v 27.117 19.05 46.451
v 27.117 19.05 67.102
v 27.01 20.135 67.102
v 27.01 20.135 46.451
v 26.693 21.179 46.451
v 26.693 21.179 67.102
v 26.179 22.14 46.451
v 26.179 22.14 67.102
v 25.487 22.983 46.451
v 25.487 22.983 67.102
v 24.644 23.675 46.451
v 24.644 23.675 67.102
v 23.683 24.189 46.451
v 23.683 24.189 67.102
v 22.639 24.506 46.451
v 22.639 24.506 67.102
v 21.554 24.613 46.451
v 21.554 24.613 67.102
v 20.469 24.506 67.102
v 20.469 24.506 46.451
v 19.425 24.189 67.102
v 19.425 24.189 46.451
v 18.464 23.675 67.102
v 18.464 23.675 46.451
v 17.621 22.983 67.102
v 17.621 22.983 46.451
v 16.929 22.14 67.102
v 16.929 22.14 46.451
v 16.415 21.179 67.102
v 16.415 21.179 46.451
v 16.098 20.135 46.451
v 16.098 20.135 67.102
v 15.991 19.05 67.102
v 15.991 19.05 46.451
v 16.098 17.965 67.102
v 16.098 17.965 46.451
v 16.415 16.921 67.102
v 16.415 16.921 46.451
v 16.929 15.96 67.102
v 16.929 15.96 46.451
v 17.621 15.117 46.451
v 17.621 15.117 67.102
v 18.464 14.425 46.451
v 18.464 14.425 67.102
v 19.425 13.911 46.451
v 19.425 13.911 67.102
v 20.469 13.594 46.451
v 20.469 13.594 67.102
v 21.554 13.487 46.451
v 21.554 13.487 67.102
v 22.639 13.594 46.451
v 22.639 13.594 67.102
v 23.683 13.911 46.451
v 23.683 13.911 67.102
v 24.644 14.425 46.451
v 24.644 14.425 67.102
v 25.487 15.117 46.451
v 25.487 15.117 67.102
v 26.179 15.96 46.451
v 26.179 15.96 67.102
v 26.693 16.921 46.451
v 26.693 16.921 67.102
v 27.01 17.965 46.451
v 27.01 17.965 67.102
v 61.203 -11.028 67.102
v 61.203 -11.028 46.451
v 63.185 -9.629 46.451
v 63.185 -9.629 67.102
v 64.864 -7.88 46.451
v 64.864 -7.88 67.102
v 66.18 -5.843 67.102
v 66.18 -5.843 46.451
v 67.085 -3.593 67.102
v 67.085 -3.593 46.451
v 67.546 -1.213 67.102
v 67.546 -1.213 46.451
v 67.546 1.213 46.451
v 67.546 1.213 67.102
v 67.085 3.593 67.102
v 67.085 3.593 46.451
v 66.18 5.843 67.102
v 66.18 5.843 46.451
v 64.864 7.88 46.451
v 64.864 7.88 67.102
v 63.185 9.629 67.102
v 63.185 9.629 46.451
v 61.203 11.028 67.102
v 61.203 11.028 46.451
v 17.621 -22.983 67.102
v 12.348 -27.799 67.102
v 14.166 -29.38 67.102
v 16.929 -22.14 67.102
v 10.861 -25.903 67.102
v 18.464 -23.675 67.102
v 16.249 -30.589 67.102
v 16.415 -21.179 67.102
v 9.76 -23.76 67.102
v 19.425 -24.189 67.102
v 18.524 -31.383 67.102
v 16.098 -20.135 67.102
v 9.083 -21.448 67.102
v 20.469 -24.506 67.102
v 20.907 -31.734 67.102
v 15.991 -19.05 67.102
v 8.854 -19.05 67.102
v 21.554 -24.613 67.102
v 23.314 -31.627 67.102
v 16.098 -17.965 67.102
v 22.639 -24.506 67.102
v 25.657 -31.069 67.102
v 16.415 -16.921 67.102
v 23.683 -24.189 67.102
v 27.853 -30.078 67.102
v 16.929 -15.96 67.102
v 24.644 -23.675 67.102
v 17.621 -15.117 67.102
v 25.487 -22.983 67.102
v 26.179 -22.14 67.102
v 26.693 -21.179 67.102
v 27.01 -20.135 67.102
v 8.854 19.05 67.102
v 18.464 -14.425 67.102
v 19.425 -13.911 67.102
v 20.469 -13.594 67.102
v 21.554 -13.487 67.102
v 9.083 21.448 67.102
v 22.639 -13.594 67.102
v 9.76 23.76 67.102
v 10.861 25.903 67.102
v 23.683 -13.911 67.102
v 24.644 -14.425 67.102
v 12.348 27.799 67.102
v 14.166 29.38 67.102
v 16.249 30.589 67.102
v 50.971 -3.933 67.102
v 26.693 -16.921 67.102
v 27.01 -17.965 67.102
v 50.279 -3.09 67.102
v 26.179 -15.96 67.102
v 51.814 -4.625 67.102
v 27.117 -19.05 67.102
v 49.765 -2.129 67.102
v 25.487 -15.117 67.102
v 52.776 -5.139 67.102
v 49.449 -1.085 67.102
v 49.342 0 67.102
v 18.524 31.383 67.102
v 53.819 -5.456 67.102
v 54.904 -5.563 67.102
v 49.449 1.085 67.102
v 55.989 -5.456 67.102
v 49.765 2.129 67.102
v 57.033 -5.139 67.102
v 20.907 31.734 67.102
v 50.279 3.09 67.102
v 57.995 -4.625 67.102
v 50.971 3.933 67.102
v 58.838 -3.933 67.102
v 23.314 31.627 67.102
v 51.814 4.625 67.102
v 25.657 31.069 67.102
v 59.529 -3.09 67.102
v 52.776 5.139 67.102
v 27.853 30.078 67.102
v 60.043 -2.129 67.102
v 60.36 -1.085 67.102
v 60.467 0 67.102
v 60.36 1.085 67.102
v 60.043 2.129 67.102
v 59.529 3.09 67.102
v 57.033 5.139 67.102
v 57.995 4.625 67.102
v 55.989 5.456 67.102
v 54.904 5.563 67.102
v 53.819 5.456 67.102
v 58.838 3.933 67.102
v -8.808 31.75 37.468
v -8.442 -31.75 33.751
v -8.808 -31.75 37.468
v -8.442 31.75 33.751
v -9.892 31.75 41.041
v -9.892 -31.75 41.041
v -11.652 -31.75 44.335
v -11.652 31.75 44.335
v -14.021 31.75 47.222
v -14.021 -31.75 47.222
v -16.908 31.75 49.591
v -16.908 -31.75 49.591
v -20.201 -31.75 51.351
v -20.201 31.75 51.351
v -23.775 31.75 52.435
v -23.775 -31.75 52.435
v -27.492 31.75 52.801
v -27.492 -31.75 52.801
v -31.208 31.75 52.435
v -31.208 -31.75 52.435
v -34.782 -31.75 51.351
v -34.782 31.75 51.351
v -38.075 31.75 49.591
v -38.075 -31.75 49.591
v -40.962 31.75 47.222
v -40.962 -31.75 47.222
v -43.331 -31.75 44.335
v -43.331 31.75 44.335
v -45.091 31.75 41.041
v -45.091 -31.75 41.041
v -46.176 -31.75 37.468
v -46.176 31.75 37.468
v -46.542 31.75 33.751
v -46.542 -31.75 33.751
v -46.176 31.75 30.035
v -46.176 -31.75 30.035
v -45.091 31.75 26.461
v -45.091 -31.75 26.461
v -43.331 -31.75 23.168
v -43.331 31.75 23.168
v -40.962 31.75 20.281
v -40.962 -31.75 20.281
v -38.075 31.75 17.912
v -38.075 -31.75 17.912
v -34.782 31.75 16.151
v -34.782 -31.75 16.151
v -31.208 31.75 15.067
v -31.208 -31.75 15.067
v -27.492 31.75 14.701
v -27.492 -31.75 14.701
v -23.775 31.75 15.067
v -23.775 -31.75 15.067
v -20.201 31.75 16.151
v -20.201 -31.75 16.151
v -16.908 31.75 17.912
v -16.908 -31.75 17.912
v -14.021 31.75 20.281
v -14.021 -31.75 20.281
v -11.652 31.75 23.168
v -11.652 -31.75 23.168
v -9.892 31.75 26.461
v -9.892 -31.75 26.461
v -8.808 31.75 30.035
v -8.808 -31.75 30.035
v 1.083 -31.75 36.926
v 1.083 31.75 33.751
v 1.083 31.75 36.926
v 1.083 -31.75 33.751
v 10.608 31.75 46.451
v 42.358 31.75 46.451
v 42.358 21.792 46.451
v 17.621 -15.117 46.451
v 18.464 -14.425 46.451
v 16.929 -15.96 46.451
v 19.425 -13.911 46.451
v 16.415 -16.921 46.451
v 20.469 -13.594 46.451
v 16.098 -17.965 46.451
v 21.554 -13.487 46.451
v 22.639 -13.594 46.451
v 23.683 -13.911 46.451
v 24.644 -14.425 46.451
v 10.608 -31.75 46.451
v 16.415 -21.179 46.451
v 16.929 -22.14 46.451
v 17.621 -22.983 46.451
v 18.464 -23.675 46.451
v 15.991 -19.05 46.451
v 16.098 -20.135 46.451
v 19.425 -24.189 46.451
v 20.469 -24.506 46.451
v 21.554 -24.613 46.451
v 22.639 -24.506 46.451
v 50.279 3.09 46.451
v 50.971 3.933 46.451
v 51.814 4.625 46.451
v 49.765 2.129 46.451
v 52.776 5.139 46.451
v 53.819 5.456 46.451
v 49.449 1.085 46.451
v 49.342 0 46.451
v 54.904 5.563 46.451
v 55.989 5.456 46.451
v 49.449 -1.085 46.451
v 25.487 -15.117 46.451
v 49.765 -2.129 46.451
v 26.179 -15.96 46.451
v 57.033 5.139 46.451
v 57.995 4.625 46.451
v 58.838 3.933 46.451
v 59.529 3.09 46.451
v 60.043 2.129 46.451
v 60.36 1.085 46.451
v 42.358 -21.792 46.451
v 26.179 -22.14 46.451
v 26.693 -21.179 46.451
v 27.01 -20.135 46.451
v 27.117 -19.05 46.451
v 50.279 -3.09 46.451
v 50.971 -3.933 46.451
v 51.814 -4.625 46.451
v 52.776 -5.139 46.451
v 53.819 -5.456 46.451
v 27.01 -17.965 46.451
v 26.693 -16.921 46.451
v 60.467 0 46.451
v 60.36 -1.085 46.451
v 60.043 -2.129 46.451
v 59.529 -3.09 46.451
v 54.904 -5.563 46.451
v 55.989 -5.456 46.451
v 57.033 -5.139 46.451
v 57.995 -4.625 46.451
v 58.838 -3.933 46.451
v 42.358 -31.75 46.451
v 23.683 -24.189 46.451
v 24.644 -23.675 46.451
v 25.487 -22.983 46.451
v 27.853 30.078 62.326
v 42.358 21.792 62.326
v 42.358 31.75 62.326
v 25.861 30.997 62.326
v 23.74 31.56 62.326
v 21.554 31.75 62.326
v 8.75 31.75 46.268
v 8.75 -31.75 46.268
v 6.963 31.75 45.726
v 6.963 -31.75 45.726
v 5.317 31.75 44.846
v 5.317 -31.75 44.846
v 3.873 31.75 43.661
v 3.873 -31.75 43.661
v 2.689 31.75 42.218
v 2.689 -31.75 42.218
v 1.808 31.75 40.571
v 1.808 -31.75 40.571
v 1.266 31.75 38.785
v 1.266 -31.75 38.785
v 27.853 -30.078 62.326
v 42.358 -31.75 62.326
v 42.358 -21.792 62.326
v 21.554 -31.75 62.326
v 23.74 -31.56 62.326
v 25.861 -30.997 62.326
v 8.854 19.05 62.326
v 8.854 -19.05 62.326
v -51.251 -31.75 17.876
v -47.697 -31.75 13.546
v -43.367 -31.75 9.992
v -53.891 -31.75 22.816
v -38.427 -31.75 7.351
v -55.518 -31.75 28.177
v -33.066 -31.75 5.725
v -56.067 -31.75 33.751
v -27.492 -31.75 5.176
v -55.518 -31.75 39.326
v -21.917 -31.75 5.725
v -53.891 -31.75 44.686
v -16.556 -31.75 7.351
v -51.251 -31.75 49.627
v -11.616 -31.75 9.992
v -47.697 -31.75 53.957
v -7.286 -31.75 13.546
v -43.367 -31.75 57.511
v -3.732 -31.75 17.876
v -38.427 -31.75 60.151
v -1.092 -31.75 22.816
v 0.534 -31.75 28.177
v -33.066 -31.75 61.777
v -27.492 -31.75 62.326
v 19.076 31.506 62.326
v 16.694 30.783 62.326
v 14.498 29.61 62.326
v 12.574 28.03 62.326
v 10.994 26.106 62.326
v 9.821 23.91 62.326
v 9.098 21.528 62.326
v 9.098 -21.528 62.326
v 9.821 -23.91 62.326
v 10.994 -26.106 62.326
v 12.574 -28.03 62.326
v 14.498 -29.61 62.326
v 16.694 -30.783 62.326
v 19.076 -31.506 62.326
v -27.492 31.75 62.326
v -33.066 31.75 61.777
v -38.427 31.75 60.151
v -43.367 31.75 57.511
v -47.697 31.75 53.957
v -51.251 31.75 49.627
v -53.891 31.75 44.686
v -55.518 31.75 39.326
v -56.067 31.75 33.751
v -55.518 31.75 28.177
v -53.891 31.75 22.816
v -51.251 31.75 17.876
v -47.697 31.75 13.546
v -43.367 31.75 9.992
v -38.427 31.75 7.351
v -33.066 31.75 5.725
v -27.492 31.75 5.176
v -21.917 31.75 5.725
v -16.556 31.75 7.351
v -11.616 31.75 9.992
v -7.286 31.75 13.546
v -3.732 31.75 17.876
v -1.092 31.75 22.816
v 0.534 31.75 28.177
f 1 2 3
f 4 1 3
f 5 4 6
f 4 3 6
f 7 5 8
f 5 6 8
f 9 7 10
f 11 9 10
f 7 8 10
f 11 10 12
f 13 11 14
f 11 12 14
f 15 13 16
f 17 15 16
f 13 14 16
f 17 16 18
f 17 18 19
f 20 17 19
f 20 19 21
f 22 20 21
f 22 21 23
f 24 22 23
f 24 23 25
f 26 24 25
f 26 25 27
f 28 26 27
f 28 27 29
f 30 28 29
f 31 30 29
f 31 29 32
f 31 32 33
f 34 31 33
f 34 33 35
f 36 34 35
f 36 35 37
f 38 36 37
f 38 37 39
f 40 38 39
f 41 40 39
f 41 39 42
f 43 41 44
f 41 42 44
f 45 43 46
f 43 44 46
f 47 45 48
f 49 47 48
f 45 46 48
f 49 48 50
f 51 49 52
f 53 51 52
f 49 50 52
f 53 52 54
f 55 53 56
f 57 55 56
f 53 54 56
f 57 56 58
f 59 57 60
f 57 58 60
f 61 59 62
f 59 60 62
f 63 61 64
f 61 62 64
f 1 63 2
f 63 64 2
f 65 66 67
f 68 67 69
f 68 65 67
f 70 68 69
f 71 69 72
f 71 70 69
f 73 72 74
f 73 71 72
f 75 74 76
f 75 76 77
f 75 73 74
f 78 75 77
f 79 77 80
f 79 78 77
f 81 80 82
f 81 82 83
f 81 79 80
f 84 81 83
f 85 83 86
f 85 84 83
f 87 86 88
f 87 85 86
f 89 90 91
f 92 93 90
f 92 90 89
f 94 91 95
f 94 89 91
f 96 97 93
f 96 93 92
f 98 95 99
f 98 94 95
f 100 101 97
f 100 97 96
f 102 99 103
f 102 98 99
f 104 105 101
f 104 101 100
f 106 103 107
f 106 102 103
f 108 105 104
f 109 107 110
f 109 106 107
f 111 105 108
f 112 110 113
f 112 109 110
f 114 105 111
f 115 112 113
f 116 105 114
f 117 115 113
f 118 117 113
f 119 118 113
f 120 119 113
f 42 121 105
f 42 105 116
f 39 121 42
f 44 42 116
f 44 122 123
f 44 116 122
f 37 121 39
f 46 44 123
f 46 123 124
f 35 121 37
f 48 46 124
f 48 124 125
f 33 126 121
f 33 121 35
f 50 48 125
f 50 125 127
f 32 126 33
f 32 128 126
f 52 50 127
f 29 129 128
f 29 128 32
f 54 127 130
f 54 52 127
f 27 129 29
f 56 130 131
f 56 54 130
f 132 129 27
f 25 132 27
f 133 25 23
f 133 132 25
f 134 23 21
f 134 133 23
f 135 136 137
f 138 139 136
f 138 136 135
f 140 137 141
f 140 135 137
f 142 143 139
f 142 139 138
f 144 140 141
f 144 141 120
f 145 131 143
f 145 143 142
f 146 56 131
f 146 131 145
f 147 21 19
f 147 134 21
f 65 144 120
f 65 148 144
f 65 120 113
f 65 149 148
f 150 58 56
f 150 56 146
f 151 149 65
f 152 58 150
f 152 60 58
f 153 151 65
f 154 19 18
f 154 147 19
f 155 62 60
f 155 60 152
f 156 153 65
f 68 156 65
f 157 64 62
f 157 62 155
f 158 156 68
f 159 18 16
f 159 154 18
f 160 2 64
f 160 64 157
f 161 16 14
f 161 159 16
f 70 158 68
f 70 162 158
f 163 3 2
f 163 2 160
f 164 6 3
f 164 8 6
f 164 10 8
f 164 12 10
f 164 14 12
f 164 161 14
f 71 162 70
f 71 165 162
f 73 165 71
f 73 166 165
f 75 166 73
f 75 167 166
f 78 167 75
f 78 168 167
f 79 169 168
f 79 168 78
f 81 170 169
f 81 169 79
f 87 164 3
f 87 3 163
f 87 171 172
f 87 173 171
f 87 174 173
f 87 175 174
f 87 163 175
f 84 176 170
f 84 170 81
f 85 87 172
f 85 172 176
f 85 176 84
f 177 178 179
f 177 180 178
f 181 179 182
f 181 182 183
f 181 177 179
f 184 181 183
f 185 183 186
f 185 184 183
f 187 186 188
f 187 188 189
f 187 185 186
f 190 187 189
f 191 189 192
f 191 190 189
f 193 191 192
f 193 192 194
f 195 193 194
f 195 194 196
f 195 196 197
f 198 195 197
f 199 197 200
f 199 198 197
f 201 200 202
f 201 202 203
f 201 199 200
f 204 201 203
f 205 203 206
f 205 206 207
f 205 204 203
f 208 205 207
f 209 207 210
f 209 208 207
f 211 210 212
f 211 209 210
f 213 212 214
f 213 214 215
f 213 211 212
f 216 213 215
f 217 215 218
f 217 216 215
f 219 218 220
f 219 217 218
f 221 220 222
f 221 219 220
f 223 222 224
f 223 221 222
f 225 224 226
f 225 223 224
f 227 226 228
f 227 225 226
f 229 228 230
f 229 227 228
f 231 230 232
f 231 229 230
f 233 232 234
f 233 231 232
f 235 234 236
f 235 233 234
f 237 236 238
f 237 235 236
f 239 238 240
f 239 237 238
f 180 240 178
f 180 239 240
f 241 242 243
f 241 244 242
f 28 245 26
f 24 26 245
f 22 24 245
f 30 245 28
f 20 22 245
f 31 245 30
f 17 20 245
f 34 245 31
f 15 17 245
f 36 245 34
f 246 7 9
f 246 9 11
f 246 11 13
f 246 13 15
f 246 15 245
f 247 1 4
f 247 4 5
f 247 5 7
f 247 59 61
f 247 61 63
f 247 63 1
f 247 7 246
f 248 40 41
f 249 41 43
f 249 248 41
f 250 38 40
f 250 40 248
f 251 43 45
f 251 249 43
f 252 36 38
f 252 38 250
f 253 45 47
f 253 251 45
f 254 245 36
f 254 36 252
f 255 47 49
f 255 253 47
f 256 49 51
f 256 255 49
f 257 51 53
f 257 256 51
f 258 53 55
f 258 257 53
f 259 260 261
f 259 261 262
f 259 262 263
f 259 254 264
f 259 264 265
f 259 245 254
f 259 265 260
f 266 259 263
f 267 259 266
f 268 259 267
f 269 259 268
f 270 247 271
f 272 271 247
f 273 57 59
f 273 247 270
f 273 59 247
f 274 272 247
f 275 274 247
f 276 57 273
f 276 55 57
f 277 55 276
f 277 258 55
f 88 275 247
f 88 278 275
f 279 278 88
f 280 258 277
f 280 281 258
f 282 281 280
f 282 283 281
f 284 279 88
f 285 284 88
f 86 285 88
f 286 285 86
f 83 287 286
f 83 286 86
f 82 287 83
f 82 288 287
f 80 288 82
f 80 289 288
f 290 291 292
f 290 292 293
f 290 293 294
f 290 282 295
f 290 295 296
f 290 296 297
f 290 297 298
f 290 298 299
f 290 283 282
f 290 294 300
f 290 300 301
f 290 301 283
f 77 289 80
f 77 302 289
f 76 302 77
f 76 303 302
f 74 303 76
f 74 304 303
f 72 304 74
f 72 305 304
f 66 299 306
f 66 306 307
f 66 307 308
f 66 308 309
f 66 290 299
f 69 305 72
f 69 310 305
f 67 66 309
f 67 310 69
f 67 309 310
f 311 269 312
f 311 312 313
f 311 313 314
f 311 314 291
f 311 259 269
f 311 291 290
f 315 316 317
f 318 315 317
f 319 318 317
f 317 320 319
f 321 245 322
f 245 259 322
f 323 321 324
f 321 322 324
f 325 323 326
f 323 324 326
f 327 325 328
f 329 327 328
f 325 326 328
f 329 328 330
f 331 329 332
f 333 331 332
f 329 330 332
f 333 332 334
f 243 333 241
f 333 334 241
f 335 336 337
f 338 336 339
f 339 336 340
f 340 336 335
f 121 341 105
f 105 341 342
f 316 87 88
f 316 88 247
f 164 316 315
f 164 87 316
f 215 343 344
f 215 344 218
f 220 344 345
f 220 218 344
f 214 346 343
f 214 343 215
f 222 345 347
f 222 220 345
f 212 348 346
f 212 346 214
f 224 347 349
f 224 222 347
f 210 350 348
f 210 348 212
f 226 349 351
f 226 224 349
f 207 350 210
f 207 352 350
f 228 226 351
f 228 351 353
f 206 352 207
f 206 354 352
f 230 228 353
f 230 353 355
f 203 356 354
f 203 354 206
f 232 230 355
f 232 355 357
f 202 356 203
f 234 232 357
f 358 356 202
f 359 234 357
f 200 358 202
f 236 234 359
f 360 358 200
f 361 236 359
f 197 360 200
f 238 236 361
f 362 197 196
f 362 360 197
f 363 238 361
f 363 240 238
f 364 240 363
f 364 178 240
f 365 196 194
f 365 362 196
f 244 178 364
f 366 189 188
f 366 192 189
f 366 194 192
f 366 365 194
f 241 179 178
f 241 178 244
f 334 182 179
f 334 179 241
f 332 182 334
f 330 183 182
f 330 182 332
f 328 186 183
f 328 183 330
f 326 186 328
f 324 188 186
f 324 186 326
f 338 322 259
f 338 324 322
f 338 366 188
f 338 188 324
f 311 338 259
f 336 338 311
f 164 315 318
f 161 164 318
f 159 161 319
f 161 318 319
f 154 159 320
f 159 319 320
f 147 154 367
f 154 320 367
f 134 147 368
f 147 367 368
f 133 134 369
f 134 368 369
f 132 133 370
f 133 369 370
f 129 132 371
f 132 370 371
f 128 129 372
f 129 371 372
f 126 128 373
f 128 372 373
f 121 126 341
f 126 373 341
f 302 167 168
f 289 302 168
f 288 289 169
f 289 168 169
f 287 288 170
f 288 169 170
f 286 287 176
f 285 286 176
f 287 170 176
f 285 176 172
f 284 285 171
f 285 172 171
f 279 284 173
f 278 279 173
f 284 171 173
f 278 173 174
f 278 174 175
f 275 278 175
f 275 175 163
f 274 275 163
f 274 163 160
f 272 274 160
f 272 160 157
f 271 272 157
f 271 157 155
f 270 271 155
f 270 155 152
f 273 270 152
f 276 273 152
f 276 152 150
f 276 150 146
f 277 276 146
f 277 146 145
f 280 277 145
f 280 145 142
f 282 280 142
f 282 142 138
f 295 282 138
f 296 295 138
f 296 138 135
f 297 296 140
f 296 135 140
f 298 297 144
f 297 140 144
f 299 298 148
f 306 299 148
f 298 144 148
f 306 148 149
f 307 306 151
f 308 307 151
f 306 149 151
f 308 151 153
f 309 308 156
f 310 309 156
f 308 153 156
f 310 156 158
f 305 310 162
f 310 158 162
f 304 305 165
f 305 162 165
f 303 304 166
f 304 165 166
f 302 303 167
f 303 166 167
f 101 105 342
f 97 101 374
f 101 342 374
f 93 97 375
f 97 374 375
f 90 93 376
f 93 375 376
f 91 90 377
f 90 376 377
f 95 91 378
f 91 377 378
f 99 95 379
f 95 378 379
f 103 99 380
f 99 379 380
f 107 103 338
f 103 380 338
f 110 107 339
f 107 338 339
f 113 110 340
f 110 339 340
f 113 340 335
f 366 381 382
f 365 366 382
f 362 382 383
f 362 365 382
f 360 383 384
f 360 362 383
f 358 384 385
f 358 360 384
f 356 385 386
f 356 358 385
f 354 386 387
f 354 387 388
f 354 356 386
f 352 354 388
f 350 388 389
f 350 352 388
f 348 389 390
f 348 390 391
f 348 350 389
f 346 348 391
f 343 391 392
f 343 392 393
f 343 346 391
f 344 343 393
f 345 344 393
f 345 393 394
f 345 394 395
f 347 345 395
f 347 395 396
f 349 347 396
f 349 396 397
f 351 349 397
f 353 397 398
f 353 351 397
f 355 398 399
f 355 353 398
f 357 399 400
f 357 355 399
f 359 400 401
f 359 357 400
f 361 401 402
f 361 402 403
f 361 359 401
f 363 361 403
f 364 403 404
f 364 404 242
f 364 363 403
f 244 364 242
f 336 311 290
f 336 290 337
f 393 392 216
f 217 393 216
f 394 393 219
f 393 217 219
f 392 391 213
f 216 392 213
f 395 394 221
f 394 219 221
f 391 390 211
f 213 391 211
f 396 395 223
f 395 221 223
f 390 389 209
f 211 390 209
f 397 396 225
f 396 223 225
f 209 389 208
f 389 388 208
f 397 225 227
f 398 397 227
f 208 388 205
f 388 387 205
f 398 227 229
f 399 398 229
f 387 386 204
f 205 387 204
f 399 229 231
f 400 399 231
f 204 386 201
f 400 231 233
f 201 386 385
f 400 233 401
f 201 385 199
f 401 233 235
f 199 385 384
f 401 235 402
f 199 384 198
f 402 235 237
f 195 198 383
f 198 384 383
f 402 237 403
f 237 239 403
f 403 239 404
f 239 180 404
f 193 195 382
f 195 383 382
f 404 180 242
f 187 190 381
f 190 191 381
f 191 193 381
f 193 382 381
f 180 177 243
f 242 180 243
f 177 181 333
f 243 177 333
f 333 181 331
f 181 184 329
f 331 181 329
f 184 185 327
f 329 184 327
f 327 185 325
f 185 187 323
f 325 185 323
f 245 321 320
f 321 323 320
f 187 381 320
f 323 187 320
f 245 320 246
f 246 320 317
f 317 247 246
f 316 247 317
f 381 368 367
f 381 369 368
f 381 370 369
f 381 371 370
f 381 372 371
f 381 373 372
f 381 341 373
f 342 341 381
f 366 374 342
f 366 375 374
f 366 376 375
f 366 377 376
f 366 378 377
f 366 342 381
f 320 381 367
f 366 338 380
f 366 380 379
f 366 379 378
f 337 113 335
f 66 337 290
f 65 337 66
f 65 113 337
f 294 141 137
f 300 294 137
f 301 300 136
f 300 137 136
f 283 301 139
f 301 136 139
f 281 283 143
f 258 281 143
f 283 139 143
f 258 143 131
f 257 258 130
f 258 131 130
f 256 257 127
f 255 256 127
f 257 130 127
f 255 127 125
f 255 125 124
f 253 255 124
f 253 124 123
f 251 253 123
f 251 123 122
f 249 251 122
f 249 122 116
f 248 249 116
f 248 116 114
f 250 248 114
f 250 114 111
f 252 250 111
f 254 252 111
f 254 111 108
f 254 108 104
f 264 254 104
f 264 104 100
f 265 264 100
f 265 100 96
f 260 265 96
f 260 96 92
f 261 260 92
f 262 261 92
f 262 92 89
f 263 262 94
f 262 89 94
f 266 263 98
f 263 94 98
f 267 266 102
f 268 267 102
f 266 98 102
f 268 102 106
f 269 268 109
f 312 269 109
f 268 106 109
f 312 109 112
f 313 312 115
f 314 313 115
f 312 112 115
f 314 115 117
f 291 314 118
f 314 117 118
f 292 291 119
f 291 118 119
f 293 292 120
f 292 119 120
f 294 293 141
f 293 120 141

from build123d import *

# Parameters (mm, degrees)
F0_R          = 19.05
F1_DEPTH      = 31.75
F2_R          = 9.525
F4_DEPTH      = 4.7752
F4_DEPTH_BACK = 15.875
F5_R          = 5.5626
F6_DEPTH      = 25.4


with BuildPart() as f1:
    # F0 (on Front) → F1 (new body, symmetric)
    with BuildSketch(Plane.XZ):
        with BuildLine():
            ThreePointArc((-27.491588, 62.326304), (-47.697164, 13.545728), (1.083412, 33.751304))
            ThreePointArc((1.083412, 33.751304), (-7.286012, 53.95688), (-27.491588, 62.326304))
        make_face()
        with Locations((-27.491588, 33.751304)):
            Circle(F0_R, mode=Mode.SUBTRACT)
        with BuildLine():
            ThreePointArc((-27.491588, 62.326304), (-7.286012, 53.95688), (1.083412, 33.751304))
            Line((1.083412, 33.751304), (1.083412, 46.451304))
            Line((1.083412, 46.451304), (42.358412, 46.451304))
            Line((42.358412, 46.451304), (42.358412, 62.326304))
            Line((42.358412, 62.326304), (-27.491588, 62.326304))
        make_face()
    extrude(amount=F1_DEPTH, both=True)

    # F2
    f2_edges = [f1.edges().sort_by_distance(p)[0] for p in [
        (1.083412, 0, 46.451304),
    ]]
    fillet(f2_edges, radius=F2_R)

    # F3 (on face) → F4 (join, two sides)
    with BuildSketch(Plane.XY.offset(62.326304)) as f4_sk:
        with BuildLine():
            ThreePointArc((27.853196, 30.077721), (15.178669, 30.033835), (8.854041, 19.05))
            Line((8.854041, 19.05), (8.854041, -19.05))
            ThreePointArc((8.854041, -19.05), (15.178669, -30.033835), (27.853196, -30.077721))
            Line((27.853196, -30.077721), (61.203396, -11.027721))
            ThreePointArc((61.203396, -11.027721), (67.604241, 0), (61.203396, 11.027721))
            Line((61.203396, 11.027721), (27.853196, 30.077721))
        make_face()
    extrude(amount=F4_DEPTH)
    extrude(f4_sk.sketch, amount=-F4_DEPTH_BACK)

    # F5 (on face) → F6 (cut)
    with BuildSketch(Plane.XY.offset(67.101504)):
        with Locations((21.554041, 19.05)):
            Circle(F5_R)
        with Locations((21.554041, -19.05)):
            Circle(F5_R)
        with Locations((54.904241, 0)):
            Circle(F5_R)
    extrude(amount=-F6_DEPTH, mode=Mode.SUBTRACT)


solid = f1.part
